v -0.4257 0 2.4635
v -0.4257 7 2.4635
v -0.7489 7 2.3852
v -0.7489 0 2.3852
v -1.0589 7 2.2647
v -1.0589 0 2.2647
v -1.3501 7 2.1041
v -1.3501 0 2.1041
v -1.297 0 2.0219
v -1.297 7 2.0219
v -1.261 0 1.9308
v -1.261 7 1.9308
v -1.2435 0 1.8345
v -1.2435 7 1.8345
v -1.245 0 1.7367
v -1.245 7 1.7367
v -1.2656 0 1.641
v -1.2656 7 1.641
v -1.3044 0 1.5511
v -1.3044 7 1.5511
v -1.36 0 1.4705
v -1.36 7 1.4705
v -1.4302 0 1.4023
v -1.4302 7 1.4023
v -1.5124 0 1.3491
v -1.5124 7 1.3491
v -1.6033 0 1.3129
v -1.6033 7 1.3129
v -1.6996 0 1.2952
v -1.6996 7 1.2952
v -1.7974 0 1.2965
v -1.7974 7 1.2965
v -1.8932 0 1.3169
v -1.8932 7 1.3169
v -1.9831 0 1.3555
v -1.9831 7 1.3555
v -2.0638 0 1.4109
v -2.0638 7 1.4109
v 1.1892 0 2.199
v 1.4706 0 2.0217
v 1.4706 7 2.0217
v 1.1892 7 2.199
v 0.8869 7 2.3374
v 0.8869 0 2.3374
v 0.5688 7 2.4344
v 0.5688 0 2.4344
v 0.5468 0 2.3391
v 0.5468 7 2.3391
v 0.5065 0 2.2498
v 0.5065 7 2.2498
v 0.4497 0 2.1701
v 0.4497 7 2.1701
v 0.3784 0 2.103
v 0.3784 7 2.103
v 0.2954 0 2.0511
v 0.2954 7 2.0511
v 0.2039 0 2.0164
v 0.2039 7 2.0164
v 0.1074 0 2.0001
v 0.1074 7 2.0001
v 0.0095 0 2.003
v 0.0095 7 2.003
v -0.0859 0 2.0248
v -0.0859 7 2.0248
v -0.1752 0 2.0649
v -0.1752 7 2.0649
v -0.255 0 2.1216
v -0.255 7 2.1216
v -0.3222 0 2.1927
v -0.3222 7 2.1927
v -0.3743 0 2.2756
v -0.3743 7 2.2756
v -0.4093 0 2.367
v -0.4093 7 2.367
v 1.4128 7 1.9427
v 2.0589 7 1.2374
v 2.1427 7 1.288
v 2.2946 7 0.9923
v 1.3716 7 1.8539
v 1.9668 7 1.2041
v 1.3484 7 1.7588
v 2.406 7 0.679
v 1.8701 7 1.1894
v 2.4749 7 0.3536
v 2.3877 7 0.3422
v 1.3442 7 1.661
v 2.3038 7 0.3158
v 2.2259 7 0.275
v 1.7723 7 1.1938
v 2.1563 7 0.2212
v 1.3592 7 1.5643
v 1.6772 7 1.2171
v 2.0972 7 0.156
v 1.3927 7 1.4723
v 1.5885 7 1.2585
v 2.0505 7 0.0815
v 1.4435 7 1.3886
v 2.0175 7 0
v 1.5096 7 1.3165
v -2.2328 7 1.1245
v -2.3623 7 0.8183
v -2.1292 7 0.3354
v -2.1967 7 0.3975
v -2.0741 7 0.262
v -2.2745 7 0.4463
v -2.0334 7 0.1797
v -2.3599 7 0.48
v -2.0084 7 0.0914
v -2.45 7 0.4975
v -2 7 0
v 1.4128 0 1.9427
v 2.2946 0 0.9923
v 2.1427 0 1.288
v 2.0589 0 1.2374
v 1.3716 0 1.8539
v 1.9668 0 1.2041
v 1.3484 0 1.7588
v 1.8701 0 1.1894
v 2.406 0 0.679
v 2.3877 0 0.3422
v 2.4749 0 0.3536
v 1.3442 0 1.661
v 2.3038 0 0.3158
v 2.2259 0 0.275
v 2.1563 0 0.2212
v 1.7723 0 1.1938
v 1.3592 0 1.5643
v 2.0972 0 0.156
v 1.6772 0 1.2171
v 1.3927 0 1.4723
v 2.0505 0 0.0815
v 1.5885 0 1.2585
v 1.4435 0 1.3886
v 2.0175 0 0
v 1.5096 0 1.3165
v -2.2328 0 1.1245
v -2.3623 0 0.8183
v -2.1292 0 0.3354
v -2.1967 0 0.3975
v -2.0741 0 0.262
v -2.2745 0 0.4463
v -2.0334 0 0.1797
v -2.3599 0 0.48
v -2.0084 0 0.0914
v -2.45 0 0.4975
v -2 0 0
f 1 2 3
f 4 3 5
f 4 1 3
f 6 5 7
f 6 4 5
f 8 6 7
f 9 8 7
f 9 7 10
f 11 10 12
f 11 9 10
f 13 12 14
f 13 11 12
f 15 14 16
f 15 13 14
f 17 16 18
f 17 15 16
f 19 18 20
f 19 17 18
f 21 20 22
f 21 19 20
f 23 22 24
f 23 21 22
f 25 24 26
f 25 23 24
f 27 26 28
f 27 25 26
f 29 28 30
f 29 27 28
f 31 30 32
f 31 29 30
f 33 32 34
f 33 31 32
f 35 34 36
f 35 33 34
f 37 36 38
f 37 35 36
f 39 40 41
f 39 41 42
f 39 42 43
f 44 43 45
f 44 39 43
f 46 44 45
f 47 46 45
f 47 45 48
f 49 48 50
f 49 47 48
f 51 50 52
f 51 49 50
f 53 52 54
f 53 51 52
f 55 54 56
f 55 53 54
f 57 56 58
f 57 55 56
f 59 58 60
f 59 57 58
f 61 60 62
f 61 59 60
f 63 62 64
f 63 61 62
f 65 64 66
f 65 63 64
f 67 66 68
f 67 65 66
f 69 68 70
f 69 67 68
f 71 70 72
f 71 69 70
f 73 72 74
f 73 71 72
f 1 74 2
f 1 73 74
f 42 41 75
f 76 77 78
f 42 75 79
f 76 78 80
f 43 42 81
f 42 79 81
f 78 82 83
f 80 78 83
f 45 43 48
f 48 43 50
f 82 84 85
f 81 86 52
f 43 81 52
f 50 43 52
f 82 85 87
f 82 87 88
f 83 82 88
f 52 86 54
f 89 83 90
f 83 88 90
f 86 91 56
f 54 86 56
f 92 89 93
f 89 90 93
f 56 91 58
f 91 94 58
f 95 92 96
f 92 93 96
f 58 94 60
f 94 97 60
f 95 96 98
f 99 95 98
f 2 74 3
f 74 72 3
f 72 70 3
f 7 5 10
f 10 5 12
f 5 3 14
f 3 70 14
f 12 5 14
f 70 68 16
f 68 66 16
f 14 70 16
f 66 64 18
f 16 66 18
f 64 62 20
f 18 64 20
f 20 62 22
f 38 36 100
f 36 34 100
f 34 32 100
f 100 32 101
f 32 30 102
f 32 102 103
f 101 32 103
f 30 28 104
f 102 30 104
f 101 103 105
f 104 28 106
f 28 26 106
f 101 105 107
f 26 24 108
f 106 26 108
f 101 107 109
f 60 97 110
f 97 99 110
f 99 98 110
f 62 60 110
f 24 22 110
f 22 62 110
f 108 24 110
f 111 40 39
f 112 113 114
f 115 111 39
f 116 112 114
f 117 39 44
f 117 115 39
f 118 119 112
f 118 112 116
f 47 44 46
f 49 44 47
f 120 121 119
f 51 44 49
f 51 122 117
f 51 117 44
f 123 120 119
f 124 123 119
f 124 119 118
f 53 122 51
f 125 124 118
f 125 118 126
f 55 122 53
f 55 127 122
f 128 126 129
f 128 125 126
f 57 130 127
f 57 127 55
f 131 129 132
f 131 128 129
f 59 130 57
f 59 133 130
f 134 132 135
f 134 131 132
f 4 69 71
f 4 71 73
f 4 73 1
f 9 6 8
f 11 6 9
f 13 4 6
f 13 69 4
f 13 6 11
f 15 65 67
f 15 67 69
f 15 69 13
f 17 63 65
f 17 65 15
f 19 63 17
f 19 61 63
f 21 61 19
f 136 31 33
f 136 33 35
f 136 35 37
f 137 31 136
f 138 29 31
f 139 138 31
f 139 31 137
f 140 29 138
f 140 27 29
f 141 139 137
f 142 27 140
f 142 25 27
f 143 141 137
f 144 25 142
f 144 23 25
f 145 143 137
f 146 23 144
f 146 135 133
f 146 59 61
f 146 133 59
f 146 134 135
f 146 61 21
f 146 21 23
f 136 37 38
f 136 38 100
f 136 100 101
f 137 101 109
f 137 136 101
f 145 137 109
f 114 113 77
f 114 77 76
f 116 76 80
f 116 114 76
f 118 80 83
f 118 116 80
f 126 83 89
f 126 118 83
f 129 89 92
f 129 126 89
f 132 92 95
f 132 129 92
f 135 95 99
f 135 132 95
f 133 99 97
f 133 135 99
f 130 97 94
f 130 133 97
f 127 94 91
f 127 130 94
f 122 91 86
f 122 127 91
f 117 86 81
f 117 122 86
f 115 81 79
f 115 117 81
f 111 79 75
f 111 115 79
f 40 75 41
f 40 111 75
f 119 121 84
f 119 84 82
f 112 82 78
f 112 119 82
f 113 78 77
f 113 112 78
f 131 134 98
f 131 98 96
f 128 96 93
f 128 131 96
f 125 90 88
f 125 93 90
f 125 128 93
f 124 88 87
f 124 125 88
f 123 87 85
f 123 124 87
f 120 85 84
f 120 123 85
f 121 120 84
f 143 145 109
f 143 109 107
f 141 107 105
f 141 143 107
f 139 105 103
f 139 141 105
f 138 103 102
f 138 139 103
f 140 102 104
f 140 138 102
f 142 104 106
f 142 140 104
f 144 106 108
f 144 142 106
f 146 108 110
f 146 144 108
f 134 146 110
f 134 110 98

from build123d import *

# Parameters (mm, degrees)
BOSS_EXTRUDE2_DEPTH = 7
SKETCH3_R           = 0.5
CUT_EXTRUDE3_DEPTH  = 8.842193571


with BuildPart() as part:
    # Sketch1 → Boss-Extrude2 (new body)
    with BuildSketch(Plane(origin=(0, 0, 0), x_dir=(1, 0, 0), z_dir=(0, 1, 0))):
        with BuildLine():
            Line((-2.5, 0), (2.5, 0))
            ThreePointArc((2.5, 0), (0, -2.5), (-2.5, 0))
        make_face()
    extrude(amount=BOSS_EXTRUDE2_DEPTH)

    # Sketch3 → Cut-Extrude3 (cut, through all)
    with BuildSketch(Plane(origin=(0, 0, 0), x_dir=(1, 0, 0), z_dir=(0, 1, 0))):
        with Locations((-2.5, 0)):
            Circle(SKETCH3_R)
        with Locations((-1.741766773, -1.793390227)):
            Circle(SKETCH3_R)
        with Locations((0.072998806, -2.498934008)):
            Circle(SKETCH3_R)
        with Locations((1.843484289, -1.688657951)):
            Circle(SKETCH3_R)
        with Locations((2.495736939, 0.145935359)):
            Circle(SKETCH3_R)
    extrude(amount=CUT_EXTRUDE3_DEPTH, mode=Mode.SUBTRACT)


solid = part.part
